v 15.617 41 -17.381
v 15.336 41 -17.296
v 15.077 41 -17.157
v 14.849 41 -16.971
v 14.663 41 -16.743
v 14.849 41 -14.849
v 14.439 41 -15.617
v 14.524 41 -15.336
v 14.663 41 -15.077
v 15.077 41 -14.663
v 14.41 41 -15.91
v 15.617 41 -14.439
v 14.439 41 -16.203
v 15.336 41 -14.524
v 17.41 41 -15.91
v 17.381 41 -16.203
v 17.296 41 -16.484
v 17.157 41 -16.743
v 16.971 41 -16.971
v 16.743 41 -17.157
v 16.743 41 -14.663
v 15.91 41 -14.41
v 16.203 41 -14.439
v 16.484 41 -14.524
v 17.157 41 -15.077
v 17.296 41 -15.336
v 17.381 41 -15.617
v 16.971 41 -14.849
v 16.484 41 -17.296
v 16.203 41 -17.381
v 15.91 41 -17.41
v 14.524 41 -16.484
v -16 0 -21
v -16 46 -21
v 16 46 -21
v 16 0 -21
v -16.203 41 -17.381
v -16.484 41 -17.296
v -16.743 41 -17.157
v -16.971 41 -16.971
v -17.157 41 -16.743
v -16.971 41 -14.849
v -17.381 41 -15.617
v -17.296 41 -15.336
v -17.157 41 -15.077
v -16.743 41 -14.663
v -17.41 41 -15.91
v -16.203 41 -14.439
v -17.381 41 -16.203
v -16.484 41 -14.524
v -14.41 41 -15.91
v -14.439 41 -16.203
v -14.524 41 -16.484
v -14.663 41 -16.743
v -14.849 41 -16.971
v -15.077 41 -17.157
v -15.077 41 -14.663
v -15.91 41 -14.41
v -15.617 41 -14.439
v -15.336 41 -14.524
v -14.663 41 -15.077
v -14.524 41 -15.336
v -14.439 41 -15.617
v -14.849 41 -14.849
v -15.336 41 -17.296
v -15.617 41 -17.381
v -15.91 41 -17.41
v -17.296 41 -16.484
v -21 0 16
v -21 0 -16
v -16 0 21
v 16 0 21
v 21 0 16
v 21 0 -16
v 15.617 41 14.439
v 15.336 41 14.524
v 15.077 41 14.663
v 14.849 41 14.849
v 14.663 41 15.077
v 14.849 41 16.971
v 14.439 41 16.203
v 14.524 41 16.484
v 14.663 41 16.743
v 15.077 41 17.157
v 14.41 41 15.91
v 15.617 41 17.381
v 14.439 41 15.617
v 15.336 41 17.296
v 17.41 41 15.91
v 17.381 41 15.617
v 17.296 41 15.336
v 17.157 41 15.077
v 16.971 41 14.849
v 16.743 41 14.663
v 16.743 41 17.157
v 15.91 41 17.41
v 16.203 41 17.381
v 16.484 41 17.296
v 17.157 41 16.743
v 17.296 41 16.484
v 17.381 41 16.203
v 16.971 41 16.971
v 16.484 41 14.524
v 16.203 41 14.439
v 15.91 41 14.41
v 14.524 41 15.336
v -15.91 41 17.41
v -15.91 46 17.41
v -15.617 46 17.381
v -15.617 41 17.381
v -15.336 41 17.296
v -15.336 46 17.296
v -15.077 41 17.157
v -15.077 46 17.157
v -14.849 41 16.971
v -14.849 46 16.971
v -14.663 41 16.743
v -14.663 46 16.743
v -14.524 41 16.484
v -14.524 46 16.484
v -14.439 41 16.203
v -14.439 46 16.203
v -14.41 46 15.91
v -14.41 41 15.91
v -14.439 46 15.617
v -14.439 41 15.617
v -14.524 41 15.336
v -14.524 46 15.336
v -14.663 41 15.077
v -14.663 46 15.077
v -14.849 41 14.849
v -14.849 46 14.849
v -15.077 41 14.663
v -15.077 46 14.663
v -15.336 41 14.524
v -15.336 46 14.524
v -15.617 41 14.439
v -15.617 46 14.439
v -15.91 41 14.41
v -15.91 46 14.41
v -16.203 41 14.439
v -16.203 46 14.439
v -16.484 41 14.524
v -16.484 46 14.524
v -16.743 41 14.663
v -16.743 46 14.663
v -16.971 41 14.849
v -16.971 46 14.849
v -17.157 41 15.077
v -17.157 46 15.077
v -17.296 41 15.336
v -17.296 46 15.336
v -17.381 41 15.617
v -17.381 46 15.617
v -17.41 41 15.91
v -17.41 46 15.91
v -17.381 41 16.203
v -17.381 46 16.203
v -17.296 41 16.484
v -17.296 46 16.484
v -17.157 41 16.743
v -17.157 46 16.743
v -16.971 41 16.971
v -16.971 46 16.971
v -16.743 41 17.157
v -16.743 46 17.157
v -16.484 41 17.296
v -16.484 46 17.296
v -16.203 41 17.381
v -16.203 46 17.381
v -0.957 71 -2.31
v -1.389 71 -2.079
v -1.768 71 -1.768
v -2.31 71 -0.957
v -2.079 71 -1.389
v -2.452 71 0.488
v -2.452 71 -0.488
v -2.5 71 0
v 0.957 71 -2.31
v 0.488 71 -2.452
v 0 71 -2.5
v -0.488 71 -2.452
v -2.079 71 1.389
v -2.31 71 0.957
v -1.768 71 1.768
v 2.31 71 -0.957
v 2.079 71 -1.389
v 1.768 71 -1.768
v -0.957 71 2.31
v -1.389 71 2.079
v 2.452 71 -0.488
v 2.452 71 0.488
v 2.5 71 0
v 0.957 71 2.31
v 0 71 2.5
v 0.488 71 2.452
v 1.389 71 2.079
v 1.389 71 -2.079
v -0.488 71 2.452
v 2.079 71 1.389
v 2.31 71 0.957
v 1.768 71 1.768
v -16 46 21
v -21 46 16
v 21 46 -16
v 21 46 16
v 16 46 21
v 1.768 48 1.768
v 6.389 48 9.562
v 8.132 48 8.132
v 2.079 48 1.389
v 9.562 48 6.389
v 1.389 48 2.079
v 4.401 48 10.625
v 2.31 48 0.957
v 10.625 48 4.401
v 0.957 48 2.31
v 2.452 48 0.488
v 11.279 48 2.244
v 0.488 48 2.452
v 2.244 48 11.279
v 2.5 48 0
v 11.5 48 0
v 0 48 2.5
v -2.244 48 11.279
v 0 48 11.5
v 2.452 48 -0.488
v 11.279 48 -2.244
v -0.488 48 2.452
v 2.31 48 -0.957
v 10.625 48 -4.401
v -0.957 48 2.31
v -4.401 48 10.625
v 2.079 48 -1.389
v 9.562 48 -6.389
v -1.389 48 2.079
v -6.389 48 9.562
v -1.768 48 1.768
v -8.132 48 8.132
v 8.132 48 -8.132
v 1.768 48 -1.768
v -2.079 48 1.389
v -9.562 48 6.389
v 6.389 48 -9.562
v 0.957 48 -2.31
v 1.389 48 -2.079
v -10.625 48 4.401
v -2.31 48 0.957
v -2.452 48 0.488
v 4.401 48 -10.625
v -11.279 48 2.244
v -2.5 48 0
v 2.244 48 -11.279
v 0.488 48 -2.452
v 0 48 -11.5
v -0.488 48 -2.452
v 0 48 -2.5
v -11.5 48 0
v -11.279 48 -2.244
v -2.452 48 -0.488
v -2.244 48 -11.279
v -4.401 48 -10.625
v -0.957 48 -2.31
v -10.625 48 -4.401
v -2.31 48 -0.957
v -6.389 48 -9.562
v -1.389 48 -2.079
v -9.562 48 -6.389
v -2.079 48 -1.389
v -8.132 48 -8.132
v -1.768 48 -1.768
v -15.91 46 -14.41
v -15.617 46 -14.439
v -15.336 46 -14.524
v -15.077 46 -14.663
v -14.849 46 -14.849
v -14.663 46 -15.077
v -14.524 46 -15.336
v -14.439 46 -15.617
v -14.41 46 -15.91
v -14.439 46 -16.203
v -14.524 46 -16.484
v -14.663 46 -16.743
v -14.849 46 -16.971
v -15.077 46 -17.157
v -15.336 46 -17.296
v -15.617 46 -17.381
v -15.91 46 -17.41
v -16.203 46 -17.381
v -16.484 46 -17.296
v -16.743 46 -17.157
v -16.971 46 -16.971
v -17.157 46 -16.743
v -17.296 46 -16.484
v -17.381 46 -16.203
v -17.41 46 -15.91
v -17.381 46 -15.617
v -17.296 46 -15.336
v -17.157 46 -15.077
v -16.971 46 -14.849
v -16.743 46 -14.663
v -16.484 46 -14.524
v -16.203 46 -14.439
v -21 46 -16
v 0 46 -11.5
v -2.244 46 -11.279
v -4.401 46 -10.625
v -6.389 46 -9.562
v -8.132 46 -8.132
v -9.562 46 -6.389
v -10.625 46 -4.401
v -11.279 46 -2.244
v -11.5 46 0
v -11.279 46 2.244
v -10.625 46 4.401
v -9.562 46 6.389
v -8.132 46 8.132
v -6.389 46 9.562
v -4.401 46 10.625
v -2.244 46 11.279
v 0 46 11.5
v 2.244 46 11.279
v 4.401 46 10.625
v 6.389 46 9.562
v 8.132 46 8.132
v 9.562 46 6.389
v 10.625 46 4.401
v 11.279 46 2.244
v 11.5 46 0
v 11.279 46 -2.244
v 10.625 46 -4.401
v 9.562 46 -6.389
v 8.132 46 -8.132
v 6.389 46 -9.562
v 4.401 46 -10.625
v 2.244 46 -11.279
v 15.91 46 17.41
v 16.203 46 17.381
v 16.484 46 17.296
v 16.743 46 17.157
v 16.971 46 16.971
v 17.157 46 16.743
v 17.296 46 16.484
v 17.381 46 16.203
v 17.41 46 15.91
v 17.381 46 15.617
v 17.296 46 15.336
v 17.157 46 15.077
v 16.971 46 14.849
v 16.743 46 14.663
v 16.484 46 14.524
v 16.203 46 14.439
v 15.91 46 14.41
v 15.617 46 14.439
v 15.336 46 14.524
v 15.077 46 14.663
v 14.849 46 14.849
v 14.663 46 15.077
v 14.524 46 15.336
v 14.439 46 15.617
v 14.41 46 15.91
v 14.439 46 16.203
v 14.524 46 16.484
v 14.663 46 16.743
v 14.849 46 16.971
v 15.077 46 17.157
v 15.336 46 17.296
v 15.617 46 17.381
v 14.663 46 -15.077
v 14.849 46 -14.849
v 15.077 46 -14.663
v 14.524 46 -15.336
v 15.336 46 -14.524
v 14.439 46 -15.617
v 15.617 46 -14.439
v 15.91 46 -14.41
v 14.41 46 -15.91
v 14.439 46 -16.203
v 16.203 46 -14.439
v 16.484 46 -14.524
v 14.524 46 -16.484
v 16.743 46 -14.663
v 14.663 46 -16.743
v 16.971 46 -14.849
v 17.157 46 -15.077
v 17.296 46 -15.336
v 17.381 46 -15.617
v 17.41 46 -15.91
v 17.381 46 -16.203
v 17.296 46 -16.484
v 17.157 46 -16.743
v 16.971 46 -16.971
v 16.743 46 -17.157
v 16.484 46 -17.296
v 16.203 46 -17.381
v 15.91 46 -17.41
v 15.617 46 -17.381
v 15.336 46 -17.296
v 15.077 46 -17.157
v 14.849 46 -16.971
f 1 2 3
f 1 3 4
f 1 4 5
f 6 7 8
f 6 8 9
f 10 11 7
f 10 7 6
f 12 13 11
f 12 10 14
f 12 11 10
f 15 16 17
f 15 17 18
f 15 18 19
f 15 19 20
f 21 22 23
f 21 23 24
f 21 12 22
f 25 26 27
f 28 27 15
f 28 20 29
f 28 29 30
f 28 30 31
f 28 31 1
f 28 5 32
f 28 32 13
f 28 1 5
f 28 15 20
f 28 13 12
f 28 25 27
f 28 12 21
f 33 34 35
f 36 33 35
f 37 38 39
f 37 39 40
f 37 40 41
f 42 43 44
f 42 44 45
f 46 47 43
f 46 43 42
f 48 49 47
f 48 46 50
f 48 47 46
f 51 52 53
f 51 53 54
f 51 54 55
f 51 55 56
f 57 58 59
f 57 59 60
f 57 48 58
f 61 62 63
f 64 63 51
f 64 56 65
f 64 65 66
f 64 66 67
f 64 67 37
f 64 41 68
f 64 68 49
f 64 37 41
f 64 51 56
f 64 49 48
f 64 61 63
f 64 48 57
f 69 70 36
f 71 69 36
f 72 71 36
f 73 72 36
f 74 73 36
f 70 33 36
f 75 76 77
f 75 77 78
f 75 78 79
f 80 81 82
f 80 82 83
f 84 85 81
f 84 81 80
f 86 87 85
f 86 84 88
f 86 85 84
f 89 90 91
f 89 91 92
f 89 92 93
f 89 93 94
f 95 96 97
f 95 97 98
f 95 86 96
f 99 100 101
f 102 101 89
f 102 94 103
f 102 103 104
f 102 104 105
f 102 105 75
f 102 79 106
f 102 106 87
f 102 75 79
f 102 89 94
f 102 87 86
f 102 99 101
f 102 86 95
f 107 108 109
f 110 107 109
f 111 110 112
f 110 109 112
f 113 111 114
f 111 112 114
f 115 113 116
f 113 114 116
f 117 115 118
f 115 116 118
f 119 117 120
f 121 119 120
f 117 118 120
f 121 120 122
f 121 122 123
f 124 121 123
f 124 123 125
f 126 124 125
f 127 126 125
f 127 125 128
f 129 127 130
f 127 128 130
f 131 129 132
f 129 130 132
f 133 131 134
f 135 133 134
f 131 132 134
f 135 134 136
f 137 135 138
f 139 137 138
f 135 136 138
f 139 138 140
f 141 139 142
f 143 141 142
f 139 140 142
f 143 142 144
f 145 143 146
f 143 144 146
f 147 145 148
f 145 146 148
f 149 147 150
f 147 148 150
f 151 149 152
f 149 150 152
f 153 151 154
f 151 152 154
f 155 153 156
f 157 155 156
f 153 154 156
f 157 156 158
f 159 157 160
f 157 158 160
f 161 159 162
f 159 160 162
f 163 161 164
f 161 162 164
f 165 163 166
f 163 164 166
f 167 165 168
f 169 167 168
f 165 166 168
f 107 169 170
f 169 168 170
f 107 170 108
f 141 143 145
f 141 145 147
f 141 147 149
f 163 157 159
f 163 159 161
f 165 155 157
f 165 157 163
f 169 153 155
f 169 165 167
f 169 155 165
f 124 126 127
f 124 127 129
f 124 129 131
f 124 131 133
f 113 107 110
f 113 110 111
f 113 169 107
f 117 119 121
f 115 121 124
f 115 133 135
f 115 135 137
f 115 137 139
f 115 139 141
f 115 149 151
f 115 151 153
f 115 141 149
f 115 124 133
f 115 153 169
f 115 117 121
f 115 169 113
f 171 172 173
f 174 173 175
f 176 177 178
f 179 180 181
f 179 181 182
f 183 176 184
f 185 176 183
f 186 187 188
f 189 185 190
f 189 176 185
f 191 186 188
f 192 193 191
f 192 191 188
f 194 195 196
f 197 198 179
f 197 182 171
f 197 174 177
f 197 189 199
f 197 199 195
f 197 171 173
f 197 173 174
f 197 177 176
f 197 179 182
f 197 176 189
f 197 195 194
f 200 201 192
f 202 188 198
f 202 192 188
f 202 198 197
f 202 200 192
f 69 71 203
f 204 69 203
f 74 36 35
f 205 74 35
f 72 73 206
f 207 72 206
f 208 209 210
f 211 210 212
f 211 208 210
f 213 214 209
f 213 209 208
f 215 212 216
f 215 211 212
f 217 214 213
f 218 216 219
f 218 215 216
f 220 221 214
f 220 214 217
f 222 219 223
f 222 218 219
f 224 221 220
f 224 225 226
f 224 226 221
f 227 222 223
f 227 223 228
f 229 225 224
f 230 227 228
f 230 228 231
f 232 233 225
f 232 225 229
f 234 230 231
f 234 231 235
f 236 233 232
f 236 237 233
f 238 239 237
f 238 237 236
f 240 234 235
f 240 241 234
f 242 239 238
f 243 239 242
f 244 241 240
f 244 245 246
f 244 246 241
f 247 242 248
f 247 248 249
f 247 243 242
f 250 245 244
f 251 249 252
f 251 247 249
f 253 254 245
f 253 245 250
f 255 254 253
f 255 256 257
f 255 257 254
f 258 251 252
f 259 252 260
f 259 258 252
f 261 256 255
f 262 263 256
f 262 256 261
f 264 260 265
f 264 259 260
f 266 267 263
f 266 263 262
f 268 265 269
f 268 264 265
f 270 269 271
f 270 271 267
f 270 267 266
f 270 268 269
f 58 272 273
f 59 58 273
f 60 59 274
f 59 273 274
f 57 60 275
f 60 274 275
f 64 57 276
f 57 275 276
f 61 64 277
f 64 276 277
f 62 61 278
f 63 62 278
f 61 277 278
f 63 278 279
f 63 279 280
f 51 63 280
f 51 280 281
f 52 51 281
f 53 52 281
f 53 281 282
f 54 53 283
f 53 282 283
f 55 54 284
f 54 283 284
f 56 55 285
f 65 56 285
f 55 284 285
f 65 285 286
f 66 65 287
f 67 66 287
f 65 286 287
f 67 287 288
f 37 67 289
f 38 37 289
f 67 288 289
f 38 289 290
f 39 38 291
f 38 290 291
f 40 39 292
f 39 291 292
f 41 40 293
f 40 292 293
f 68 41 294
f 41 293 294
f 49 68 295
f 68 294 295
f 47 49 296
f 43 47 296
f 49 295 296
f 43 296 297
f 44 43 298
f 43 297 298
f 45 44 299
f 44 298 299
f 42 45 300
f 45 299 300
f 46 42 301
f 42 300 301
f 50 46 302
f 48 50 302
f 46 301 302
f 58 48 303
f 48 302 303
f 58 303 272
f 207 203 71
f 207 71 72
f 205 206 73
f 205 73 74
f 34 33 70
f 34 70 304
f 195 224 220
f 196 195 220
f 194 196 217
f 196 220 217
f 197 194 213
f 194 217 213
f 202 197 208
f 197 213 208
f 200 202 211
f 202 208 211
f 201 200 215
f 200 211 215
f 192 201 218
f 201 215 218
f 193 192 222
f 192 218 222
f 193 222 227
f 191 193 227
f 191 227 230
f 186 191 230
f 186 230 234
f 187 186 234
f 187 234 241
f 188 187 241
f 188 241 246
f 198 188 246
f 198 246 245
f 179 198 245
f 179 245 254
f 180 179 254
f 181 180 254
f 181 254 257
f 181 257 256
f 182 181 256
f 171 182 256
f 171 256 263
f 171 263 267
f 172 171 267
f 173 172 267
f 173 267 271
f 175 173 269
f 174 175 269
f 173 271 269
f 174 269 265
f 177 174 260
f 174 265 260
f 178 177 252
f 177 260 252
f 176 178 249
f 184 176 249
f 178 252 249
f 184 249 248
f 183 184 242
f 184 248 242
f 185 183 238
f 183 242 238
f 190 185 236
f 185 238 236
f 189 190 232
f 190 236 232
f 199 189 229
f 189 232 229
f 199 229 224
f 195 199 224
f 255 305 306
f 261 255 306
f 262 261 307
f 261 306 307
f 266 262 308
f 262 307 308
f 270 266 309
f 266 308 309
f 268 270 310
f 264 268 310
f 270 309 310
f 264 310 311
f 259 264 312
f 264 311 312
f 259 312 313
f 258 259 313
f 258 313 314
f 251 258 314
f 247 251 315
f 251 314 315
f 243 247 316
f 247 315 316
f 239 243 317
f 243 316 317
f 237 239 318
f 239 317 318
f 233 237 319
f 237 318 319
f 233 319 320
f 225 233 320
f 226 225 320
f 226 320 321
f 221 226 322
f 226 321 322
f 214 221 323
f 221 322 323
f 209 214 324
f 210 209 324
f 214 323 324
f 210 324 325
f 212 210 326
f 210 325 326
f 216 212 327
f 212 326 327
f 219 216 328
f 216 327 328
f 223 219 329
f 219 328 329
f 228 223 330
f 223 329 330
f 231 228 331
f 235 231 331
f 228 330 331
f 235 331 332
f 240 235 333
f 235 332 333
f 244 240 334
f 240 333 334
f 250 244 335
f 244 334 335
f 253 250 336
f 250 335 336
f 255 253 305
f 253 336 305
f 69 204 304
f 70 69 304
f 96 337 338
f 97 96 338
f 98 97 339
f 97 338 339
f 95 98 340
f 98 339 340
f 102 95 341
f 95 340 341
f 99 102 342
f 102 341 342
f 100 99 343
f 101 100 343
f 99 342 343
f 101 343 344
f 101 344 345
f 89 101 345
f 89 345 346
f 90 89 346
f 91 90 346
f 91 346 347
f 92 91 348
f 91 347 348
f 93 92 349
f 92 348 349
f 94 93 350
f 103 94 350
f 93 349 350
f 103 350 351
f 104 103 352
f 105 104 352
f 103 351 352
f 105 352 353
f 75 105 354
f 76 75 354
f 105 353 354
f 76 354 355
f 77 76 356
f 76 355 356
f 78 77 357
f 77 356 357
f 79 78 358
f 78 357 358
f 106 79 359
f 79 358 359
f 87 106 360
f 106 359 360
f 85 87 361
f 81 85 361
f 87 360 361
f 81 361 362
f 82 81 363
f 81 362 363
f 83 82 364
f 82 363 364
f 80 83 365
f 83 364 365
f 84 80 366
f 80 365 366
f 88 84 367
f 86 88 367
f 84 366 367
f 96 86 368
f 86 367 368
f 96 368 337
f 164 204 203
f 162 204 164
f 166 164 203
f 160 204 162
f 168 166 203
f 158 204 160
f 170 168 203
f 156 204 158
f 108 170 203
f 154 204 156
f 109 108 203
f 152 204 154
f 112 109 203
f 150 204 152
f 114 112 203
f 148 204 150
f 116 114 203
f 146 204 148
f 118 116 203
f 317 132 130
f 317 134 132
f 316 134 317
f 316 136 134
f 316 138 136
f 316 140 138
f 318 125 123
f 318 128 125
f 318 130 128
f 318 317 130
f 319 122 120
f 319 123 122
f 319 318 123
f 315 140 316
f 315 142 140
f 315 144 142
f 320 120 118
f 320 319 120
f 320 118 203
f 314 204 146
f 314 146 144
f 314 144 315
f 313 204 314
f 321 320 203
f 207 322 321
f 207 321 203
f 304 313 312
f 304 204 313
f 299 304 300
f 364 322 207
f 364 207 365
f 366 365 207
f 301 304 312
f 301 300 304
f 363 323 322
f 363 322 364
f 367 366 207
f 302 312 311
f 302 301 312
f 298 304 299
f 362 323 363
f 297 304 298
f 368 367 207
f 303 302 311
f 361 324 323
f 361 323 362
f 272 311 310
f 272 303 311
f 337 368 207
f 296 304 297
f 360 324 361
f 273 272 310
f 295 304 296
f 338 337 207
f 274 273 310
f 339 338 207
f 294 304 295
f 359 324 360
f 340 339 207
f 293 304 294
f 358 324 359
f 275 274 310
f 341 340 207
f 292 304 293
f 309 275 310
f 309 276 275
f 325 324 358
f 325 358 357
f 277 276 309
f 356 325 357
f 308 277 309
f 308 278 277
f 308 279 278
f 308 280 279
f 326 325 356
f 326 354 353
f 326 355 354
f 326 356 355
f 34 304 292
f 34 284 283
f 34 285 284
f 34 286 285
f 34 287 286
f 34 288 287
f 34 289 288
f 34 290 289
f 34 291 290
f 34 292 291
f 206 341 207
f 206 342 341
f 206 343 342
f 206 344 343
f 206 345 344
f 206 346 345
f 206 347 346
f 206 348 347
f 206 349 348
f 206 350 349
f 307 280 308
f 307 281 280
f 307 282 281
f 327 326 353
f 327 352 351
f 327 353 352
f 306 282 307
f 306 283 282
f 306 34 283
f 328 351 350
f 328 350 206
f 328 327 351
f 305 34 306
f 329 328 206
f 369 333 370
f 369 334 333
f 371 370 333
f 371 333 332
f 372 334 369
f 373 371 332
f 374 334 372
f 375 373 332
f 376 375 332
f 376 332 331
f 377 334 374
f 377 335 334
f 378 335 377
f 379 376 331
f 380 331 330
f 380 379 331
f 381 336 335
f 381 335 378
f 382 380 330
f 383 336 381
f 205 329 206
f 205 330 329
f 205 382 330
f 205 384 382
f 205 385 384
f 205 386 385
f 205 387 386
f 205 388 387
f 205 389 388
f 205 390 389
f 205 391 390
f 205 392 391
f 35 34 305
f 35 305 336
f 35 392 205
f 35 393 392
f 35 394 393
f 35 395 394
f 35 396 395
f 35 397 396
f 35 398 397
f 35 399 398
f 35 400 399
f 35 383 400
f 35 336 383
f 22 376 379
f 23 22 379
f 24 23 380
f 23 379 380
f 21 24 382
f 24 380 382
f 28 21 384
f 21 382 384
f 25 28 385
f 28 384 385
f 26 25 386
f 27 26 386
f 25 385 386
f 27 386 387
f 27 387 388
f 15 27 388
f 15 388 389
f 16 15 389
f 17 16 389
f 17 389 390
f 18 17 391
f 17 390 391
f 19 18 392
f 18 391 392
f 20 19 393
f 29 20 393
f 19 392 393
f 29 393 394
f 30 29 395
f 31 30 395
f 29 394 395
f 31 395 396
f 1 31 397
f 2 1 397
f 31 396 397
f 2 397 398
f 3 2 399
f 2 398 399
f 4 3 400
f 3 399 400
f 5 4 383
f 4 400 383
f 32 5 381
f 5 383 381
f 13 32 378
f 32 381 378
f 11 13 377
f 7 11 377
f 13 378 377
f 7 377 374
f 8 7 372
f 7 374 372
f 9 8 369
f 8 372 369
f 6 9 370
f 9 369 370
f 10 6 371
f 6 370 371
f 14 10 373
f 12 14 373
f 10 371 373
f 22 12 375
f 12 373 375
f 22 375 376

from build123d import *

# Parameters (mm, degrees)
SKETCH1_W           = 42
SKETCH1_H           = 42
BOSS_EXTRUDE1_DEPTH = 46
CHAMFER1_SIZE       = 5
SKETCH2_R           = 11.5
BOSS_EXTRUDE2_DEPTH = 2
SKETCH3_R           = 2.5
BOSS_EXTRUDE3_DEPTH = 25
SKETCH4_R           = 1.5
CUT_EXTRUDE1_DEPTH  = 5


with BuildPart() as part:
    # Sketch1 → Boss-Extrude1 (new body)
    with BuildSketch(Plane(origin=(0, 0, 0), x_dir=(1, 0, 0), z_dir=(0, 1, 0))):
        Rectangle(SKETCH1_W, SKETCH1_H)
    extrude(amount=BOSS_EXTRUDE1_DEPTH)

    # Chamfer1
    chamfer1_edges = [part.edges().sort_by_distance(p)[0] for p in [
        (21, 23, 21),
        (-21, 23, 21),
        (-21, 23, -21),
        (21, 23, -21),
    ]]
    chamfer(chamfer1_edges, length=CHAMFER1_SIZE)

    # Sketch2 → Boss-Extrude2 (add)
    with BuildSketch(Plane(origin=(0, 46, 0), x_dir=(1, 0, 0), z_dir=(0, 1, 0))):
        with Locations(Location((0, 0, 0), (0, 0, 90))):
            Circle(SKETCH2_R)
    extrude(amount=BOSS_EXTRUDE2_DEPTH)

    # Sketch3 → Boss-Extrude3 (add)
    with BuildSketch(Plane(origin=(0, 46, 0), x_dir=(1, 0, 0), z_dir=(0, 1, 0))):
        with Locations(Location((0, 0, 0), (0, 0, 270))):
            Circle(SKETCH3_R)
    extrude(amount=BOSS_EXTRUDE3_DEPTH)

    # Sketch4 → Cut-Extrude1 (cut)
    with BuildSketch(Plane(origin=(0, 46, 0), x_dir=(1, 0, 0), z_dir=(0, 1, 0))):
        with Locations(Location((-15.909902577, 15.909902577, 0), (0, 0, 270))):
            Circle(SKETCH4_R)
        with Locations(Location((15.909902577, 15.909902577, 0), (0, 0, 270))):
            Circle(SKETCH4_R)
        with Locations(Location((15.909902577, -15.909902577, 0), (0, 0, 270))):
            Circle(SKETCH4_R)
        with Locations(Location((-15.909902577, -15.909902577, 0), (0, 0, 270))):
            Circle(SKETCH4_R)
    extrude(amount=-CUT_EXTRUDE1_DEPTH, mode=Mode.SUBTRACT)


solid = part.part
